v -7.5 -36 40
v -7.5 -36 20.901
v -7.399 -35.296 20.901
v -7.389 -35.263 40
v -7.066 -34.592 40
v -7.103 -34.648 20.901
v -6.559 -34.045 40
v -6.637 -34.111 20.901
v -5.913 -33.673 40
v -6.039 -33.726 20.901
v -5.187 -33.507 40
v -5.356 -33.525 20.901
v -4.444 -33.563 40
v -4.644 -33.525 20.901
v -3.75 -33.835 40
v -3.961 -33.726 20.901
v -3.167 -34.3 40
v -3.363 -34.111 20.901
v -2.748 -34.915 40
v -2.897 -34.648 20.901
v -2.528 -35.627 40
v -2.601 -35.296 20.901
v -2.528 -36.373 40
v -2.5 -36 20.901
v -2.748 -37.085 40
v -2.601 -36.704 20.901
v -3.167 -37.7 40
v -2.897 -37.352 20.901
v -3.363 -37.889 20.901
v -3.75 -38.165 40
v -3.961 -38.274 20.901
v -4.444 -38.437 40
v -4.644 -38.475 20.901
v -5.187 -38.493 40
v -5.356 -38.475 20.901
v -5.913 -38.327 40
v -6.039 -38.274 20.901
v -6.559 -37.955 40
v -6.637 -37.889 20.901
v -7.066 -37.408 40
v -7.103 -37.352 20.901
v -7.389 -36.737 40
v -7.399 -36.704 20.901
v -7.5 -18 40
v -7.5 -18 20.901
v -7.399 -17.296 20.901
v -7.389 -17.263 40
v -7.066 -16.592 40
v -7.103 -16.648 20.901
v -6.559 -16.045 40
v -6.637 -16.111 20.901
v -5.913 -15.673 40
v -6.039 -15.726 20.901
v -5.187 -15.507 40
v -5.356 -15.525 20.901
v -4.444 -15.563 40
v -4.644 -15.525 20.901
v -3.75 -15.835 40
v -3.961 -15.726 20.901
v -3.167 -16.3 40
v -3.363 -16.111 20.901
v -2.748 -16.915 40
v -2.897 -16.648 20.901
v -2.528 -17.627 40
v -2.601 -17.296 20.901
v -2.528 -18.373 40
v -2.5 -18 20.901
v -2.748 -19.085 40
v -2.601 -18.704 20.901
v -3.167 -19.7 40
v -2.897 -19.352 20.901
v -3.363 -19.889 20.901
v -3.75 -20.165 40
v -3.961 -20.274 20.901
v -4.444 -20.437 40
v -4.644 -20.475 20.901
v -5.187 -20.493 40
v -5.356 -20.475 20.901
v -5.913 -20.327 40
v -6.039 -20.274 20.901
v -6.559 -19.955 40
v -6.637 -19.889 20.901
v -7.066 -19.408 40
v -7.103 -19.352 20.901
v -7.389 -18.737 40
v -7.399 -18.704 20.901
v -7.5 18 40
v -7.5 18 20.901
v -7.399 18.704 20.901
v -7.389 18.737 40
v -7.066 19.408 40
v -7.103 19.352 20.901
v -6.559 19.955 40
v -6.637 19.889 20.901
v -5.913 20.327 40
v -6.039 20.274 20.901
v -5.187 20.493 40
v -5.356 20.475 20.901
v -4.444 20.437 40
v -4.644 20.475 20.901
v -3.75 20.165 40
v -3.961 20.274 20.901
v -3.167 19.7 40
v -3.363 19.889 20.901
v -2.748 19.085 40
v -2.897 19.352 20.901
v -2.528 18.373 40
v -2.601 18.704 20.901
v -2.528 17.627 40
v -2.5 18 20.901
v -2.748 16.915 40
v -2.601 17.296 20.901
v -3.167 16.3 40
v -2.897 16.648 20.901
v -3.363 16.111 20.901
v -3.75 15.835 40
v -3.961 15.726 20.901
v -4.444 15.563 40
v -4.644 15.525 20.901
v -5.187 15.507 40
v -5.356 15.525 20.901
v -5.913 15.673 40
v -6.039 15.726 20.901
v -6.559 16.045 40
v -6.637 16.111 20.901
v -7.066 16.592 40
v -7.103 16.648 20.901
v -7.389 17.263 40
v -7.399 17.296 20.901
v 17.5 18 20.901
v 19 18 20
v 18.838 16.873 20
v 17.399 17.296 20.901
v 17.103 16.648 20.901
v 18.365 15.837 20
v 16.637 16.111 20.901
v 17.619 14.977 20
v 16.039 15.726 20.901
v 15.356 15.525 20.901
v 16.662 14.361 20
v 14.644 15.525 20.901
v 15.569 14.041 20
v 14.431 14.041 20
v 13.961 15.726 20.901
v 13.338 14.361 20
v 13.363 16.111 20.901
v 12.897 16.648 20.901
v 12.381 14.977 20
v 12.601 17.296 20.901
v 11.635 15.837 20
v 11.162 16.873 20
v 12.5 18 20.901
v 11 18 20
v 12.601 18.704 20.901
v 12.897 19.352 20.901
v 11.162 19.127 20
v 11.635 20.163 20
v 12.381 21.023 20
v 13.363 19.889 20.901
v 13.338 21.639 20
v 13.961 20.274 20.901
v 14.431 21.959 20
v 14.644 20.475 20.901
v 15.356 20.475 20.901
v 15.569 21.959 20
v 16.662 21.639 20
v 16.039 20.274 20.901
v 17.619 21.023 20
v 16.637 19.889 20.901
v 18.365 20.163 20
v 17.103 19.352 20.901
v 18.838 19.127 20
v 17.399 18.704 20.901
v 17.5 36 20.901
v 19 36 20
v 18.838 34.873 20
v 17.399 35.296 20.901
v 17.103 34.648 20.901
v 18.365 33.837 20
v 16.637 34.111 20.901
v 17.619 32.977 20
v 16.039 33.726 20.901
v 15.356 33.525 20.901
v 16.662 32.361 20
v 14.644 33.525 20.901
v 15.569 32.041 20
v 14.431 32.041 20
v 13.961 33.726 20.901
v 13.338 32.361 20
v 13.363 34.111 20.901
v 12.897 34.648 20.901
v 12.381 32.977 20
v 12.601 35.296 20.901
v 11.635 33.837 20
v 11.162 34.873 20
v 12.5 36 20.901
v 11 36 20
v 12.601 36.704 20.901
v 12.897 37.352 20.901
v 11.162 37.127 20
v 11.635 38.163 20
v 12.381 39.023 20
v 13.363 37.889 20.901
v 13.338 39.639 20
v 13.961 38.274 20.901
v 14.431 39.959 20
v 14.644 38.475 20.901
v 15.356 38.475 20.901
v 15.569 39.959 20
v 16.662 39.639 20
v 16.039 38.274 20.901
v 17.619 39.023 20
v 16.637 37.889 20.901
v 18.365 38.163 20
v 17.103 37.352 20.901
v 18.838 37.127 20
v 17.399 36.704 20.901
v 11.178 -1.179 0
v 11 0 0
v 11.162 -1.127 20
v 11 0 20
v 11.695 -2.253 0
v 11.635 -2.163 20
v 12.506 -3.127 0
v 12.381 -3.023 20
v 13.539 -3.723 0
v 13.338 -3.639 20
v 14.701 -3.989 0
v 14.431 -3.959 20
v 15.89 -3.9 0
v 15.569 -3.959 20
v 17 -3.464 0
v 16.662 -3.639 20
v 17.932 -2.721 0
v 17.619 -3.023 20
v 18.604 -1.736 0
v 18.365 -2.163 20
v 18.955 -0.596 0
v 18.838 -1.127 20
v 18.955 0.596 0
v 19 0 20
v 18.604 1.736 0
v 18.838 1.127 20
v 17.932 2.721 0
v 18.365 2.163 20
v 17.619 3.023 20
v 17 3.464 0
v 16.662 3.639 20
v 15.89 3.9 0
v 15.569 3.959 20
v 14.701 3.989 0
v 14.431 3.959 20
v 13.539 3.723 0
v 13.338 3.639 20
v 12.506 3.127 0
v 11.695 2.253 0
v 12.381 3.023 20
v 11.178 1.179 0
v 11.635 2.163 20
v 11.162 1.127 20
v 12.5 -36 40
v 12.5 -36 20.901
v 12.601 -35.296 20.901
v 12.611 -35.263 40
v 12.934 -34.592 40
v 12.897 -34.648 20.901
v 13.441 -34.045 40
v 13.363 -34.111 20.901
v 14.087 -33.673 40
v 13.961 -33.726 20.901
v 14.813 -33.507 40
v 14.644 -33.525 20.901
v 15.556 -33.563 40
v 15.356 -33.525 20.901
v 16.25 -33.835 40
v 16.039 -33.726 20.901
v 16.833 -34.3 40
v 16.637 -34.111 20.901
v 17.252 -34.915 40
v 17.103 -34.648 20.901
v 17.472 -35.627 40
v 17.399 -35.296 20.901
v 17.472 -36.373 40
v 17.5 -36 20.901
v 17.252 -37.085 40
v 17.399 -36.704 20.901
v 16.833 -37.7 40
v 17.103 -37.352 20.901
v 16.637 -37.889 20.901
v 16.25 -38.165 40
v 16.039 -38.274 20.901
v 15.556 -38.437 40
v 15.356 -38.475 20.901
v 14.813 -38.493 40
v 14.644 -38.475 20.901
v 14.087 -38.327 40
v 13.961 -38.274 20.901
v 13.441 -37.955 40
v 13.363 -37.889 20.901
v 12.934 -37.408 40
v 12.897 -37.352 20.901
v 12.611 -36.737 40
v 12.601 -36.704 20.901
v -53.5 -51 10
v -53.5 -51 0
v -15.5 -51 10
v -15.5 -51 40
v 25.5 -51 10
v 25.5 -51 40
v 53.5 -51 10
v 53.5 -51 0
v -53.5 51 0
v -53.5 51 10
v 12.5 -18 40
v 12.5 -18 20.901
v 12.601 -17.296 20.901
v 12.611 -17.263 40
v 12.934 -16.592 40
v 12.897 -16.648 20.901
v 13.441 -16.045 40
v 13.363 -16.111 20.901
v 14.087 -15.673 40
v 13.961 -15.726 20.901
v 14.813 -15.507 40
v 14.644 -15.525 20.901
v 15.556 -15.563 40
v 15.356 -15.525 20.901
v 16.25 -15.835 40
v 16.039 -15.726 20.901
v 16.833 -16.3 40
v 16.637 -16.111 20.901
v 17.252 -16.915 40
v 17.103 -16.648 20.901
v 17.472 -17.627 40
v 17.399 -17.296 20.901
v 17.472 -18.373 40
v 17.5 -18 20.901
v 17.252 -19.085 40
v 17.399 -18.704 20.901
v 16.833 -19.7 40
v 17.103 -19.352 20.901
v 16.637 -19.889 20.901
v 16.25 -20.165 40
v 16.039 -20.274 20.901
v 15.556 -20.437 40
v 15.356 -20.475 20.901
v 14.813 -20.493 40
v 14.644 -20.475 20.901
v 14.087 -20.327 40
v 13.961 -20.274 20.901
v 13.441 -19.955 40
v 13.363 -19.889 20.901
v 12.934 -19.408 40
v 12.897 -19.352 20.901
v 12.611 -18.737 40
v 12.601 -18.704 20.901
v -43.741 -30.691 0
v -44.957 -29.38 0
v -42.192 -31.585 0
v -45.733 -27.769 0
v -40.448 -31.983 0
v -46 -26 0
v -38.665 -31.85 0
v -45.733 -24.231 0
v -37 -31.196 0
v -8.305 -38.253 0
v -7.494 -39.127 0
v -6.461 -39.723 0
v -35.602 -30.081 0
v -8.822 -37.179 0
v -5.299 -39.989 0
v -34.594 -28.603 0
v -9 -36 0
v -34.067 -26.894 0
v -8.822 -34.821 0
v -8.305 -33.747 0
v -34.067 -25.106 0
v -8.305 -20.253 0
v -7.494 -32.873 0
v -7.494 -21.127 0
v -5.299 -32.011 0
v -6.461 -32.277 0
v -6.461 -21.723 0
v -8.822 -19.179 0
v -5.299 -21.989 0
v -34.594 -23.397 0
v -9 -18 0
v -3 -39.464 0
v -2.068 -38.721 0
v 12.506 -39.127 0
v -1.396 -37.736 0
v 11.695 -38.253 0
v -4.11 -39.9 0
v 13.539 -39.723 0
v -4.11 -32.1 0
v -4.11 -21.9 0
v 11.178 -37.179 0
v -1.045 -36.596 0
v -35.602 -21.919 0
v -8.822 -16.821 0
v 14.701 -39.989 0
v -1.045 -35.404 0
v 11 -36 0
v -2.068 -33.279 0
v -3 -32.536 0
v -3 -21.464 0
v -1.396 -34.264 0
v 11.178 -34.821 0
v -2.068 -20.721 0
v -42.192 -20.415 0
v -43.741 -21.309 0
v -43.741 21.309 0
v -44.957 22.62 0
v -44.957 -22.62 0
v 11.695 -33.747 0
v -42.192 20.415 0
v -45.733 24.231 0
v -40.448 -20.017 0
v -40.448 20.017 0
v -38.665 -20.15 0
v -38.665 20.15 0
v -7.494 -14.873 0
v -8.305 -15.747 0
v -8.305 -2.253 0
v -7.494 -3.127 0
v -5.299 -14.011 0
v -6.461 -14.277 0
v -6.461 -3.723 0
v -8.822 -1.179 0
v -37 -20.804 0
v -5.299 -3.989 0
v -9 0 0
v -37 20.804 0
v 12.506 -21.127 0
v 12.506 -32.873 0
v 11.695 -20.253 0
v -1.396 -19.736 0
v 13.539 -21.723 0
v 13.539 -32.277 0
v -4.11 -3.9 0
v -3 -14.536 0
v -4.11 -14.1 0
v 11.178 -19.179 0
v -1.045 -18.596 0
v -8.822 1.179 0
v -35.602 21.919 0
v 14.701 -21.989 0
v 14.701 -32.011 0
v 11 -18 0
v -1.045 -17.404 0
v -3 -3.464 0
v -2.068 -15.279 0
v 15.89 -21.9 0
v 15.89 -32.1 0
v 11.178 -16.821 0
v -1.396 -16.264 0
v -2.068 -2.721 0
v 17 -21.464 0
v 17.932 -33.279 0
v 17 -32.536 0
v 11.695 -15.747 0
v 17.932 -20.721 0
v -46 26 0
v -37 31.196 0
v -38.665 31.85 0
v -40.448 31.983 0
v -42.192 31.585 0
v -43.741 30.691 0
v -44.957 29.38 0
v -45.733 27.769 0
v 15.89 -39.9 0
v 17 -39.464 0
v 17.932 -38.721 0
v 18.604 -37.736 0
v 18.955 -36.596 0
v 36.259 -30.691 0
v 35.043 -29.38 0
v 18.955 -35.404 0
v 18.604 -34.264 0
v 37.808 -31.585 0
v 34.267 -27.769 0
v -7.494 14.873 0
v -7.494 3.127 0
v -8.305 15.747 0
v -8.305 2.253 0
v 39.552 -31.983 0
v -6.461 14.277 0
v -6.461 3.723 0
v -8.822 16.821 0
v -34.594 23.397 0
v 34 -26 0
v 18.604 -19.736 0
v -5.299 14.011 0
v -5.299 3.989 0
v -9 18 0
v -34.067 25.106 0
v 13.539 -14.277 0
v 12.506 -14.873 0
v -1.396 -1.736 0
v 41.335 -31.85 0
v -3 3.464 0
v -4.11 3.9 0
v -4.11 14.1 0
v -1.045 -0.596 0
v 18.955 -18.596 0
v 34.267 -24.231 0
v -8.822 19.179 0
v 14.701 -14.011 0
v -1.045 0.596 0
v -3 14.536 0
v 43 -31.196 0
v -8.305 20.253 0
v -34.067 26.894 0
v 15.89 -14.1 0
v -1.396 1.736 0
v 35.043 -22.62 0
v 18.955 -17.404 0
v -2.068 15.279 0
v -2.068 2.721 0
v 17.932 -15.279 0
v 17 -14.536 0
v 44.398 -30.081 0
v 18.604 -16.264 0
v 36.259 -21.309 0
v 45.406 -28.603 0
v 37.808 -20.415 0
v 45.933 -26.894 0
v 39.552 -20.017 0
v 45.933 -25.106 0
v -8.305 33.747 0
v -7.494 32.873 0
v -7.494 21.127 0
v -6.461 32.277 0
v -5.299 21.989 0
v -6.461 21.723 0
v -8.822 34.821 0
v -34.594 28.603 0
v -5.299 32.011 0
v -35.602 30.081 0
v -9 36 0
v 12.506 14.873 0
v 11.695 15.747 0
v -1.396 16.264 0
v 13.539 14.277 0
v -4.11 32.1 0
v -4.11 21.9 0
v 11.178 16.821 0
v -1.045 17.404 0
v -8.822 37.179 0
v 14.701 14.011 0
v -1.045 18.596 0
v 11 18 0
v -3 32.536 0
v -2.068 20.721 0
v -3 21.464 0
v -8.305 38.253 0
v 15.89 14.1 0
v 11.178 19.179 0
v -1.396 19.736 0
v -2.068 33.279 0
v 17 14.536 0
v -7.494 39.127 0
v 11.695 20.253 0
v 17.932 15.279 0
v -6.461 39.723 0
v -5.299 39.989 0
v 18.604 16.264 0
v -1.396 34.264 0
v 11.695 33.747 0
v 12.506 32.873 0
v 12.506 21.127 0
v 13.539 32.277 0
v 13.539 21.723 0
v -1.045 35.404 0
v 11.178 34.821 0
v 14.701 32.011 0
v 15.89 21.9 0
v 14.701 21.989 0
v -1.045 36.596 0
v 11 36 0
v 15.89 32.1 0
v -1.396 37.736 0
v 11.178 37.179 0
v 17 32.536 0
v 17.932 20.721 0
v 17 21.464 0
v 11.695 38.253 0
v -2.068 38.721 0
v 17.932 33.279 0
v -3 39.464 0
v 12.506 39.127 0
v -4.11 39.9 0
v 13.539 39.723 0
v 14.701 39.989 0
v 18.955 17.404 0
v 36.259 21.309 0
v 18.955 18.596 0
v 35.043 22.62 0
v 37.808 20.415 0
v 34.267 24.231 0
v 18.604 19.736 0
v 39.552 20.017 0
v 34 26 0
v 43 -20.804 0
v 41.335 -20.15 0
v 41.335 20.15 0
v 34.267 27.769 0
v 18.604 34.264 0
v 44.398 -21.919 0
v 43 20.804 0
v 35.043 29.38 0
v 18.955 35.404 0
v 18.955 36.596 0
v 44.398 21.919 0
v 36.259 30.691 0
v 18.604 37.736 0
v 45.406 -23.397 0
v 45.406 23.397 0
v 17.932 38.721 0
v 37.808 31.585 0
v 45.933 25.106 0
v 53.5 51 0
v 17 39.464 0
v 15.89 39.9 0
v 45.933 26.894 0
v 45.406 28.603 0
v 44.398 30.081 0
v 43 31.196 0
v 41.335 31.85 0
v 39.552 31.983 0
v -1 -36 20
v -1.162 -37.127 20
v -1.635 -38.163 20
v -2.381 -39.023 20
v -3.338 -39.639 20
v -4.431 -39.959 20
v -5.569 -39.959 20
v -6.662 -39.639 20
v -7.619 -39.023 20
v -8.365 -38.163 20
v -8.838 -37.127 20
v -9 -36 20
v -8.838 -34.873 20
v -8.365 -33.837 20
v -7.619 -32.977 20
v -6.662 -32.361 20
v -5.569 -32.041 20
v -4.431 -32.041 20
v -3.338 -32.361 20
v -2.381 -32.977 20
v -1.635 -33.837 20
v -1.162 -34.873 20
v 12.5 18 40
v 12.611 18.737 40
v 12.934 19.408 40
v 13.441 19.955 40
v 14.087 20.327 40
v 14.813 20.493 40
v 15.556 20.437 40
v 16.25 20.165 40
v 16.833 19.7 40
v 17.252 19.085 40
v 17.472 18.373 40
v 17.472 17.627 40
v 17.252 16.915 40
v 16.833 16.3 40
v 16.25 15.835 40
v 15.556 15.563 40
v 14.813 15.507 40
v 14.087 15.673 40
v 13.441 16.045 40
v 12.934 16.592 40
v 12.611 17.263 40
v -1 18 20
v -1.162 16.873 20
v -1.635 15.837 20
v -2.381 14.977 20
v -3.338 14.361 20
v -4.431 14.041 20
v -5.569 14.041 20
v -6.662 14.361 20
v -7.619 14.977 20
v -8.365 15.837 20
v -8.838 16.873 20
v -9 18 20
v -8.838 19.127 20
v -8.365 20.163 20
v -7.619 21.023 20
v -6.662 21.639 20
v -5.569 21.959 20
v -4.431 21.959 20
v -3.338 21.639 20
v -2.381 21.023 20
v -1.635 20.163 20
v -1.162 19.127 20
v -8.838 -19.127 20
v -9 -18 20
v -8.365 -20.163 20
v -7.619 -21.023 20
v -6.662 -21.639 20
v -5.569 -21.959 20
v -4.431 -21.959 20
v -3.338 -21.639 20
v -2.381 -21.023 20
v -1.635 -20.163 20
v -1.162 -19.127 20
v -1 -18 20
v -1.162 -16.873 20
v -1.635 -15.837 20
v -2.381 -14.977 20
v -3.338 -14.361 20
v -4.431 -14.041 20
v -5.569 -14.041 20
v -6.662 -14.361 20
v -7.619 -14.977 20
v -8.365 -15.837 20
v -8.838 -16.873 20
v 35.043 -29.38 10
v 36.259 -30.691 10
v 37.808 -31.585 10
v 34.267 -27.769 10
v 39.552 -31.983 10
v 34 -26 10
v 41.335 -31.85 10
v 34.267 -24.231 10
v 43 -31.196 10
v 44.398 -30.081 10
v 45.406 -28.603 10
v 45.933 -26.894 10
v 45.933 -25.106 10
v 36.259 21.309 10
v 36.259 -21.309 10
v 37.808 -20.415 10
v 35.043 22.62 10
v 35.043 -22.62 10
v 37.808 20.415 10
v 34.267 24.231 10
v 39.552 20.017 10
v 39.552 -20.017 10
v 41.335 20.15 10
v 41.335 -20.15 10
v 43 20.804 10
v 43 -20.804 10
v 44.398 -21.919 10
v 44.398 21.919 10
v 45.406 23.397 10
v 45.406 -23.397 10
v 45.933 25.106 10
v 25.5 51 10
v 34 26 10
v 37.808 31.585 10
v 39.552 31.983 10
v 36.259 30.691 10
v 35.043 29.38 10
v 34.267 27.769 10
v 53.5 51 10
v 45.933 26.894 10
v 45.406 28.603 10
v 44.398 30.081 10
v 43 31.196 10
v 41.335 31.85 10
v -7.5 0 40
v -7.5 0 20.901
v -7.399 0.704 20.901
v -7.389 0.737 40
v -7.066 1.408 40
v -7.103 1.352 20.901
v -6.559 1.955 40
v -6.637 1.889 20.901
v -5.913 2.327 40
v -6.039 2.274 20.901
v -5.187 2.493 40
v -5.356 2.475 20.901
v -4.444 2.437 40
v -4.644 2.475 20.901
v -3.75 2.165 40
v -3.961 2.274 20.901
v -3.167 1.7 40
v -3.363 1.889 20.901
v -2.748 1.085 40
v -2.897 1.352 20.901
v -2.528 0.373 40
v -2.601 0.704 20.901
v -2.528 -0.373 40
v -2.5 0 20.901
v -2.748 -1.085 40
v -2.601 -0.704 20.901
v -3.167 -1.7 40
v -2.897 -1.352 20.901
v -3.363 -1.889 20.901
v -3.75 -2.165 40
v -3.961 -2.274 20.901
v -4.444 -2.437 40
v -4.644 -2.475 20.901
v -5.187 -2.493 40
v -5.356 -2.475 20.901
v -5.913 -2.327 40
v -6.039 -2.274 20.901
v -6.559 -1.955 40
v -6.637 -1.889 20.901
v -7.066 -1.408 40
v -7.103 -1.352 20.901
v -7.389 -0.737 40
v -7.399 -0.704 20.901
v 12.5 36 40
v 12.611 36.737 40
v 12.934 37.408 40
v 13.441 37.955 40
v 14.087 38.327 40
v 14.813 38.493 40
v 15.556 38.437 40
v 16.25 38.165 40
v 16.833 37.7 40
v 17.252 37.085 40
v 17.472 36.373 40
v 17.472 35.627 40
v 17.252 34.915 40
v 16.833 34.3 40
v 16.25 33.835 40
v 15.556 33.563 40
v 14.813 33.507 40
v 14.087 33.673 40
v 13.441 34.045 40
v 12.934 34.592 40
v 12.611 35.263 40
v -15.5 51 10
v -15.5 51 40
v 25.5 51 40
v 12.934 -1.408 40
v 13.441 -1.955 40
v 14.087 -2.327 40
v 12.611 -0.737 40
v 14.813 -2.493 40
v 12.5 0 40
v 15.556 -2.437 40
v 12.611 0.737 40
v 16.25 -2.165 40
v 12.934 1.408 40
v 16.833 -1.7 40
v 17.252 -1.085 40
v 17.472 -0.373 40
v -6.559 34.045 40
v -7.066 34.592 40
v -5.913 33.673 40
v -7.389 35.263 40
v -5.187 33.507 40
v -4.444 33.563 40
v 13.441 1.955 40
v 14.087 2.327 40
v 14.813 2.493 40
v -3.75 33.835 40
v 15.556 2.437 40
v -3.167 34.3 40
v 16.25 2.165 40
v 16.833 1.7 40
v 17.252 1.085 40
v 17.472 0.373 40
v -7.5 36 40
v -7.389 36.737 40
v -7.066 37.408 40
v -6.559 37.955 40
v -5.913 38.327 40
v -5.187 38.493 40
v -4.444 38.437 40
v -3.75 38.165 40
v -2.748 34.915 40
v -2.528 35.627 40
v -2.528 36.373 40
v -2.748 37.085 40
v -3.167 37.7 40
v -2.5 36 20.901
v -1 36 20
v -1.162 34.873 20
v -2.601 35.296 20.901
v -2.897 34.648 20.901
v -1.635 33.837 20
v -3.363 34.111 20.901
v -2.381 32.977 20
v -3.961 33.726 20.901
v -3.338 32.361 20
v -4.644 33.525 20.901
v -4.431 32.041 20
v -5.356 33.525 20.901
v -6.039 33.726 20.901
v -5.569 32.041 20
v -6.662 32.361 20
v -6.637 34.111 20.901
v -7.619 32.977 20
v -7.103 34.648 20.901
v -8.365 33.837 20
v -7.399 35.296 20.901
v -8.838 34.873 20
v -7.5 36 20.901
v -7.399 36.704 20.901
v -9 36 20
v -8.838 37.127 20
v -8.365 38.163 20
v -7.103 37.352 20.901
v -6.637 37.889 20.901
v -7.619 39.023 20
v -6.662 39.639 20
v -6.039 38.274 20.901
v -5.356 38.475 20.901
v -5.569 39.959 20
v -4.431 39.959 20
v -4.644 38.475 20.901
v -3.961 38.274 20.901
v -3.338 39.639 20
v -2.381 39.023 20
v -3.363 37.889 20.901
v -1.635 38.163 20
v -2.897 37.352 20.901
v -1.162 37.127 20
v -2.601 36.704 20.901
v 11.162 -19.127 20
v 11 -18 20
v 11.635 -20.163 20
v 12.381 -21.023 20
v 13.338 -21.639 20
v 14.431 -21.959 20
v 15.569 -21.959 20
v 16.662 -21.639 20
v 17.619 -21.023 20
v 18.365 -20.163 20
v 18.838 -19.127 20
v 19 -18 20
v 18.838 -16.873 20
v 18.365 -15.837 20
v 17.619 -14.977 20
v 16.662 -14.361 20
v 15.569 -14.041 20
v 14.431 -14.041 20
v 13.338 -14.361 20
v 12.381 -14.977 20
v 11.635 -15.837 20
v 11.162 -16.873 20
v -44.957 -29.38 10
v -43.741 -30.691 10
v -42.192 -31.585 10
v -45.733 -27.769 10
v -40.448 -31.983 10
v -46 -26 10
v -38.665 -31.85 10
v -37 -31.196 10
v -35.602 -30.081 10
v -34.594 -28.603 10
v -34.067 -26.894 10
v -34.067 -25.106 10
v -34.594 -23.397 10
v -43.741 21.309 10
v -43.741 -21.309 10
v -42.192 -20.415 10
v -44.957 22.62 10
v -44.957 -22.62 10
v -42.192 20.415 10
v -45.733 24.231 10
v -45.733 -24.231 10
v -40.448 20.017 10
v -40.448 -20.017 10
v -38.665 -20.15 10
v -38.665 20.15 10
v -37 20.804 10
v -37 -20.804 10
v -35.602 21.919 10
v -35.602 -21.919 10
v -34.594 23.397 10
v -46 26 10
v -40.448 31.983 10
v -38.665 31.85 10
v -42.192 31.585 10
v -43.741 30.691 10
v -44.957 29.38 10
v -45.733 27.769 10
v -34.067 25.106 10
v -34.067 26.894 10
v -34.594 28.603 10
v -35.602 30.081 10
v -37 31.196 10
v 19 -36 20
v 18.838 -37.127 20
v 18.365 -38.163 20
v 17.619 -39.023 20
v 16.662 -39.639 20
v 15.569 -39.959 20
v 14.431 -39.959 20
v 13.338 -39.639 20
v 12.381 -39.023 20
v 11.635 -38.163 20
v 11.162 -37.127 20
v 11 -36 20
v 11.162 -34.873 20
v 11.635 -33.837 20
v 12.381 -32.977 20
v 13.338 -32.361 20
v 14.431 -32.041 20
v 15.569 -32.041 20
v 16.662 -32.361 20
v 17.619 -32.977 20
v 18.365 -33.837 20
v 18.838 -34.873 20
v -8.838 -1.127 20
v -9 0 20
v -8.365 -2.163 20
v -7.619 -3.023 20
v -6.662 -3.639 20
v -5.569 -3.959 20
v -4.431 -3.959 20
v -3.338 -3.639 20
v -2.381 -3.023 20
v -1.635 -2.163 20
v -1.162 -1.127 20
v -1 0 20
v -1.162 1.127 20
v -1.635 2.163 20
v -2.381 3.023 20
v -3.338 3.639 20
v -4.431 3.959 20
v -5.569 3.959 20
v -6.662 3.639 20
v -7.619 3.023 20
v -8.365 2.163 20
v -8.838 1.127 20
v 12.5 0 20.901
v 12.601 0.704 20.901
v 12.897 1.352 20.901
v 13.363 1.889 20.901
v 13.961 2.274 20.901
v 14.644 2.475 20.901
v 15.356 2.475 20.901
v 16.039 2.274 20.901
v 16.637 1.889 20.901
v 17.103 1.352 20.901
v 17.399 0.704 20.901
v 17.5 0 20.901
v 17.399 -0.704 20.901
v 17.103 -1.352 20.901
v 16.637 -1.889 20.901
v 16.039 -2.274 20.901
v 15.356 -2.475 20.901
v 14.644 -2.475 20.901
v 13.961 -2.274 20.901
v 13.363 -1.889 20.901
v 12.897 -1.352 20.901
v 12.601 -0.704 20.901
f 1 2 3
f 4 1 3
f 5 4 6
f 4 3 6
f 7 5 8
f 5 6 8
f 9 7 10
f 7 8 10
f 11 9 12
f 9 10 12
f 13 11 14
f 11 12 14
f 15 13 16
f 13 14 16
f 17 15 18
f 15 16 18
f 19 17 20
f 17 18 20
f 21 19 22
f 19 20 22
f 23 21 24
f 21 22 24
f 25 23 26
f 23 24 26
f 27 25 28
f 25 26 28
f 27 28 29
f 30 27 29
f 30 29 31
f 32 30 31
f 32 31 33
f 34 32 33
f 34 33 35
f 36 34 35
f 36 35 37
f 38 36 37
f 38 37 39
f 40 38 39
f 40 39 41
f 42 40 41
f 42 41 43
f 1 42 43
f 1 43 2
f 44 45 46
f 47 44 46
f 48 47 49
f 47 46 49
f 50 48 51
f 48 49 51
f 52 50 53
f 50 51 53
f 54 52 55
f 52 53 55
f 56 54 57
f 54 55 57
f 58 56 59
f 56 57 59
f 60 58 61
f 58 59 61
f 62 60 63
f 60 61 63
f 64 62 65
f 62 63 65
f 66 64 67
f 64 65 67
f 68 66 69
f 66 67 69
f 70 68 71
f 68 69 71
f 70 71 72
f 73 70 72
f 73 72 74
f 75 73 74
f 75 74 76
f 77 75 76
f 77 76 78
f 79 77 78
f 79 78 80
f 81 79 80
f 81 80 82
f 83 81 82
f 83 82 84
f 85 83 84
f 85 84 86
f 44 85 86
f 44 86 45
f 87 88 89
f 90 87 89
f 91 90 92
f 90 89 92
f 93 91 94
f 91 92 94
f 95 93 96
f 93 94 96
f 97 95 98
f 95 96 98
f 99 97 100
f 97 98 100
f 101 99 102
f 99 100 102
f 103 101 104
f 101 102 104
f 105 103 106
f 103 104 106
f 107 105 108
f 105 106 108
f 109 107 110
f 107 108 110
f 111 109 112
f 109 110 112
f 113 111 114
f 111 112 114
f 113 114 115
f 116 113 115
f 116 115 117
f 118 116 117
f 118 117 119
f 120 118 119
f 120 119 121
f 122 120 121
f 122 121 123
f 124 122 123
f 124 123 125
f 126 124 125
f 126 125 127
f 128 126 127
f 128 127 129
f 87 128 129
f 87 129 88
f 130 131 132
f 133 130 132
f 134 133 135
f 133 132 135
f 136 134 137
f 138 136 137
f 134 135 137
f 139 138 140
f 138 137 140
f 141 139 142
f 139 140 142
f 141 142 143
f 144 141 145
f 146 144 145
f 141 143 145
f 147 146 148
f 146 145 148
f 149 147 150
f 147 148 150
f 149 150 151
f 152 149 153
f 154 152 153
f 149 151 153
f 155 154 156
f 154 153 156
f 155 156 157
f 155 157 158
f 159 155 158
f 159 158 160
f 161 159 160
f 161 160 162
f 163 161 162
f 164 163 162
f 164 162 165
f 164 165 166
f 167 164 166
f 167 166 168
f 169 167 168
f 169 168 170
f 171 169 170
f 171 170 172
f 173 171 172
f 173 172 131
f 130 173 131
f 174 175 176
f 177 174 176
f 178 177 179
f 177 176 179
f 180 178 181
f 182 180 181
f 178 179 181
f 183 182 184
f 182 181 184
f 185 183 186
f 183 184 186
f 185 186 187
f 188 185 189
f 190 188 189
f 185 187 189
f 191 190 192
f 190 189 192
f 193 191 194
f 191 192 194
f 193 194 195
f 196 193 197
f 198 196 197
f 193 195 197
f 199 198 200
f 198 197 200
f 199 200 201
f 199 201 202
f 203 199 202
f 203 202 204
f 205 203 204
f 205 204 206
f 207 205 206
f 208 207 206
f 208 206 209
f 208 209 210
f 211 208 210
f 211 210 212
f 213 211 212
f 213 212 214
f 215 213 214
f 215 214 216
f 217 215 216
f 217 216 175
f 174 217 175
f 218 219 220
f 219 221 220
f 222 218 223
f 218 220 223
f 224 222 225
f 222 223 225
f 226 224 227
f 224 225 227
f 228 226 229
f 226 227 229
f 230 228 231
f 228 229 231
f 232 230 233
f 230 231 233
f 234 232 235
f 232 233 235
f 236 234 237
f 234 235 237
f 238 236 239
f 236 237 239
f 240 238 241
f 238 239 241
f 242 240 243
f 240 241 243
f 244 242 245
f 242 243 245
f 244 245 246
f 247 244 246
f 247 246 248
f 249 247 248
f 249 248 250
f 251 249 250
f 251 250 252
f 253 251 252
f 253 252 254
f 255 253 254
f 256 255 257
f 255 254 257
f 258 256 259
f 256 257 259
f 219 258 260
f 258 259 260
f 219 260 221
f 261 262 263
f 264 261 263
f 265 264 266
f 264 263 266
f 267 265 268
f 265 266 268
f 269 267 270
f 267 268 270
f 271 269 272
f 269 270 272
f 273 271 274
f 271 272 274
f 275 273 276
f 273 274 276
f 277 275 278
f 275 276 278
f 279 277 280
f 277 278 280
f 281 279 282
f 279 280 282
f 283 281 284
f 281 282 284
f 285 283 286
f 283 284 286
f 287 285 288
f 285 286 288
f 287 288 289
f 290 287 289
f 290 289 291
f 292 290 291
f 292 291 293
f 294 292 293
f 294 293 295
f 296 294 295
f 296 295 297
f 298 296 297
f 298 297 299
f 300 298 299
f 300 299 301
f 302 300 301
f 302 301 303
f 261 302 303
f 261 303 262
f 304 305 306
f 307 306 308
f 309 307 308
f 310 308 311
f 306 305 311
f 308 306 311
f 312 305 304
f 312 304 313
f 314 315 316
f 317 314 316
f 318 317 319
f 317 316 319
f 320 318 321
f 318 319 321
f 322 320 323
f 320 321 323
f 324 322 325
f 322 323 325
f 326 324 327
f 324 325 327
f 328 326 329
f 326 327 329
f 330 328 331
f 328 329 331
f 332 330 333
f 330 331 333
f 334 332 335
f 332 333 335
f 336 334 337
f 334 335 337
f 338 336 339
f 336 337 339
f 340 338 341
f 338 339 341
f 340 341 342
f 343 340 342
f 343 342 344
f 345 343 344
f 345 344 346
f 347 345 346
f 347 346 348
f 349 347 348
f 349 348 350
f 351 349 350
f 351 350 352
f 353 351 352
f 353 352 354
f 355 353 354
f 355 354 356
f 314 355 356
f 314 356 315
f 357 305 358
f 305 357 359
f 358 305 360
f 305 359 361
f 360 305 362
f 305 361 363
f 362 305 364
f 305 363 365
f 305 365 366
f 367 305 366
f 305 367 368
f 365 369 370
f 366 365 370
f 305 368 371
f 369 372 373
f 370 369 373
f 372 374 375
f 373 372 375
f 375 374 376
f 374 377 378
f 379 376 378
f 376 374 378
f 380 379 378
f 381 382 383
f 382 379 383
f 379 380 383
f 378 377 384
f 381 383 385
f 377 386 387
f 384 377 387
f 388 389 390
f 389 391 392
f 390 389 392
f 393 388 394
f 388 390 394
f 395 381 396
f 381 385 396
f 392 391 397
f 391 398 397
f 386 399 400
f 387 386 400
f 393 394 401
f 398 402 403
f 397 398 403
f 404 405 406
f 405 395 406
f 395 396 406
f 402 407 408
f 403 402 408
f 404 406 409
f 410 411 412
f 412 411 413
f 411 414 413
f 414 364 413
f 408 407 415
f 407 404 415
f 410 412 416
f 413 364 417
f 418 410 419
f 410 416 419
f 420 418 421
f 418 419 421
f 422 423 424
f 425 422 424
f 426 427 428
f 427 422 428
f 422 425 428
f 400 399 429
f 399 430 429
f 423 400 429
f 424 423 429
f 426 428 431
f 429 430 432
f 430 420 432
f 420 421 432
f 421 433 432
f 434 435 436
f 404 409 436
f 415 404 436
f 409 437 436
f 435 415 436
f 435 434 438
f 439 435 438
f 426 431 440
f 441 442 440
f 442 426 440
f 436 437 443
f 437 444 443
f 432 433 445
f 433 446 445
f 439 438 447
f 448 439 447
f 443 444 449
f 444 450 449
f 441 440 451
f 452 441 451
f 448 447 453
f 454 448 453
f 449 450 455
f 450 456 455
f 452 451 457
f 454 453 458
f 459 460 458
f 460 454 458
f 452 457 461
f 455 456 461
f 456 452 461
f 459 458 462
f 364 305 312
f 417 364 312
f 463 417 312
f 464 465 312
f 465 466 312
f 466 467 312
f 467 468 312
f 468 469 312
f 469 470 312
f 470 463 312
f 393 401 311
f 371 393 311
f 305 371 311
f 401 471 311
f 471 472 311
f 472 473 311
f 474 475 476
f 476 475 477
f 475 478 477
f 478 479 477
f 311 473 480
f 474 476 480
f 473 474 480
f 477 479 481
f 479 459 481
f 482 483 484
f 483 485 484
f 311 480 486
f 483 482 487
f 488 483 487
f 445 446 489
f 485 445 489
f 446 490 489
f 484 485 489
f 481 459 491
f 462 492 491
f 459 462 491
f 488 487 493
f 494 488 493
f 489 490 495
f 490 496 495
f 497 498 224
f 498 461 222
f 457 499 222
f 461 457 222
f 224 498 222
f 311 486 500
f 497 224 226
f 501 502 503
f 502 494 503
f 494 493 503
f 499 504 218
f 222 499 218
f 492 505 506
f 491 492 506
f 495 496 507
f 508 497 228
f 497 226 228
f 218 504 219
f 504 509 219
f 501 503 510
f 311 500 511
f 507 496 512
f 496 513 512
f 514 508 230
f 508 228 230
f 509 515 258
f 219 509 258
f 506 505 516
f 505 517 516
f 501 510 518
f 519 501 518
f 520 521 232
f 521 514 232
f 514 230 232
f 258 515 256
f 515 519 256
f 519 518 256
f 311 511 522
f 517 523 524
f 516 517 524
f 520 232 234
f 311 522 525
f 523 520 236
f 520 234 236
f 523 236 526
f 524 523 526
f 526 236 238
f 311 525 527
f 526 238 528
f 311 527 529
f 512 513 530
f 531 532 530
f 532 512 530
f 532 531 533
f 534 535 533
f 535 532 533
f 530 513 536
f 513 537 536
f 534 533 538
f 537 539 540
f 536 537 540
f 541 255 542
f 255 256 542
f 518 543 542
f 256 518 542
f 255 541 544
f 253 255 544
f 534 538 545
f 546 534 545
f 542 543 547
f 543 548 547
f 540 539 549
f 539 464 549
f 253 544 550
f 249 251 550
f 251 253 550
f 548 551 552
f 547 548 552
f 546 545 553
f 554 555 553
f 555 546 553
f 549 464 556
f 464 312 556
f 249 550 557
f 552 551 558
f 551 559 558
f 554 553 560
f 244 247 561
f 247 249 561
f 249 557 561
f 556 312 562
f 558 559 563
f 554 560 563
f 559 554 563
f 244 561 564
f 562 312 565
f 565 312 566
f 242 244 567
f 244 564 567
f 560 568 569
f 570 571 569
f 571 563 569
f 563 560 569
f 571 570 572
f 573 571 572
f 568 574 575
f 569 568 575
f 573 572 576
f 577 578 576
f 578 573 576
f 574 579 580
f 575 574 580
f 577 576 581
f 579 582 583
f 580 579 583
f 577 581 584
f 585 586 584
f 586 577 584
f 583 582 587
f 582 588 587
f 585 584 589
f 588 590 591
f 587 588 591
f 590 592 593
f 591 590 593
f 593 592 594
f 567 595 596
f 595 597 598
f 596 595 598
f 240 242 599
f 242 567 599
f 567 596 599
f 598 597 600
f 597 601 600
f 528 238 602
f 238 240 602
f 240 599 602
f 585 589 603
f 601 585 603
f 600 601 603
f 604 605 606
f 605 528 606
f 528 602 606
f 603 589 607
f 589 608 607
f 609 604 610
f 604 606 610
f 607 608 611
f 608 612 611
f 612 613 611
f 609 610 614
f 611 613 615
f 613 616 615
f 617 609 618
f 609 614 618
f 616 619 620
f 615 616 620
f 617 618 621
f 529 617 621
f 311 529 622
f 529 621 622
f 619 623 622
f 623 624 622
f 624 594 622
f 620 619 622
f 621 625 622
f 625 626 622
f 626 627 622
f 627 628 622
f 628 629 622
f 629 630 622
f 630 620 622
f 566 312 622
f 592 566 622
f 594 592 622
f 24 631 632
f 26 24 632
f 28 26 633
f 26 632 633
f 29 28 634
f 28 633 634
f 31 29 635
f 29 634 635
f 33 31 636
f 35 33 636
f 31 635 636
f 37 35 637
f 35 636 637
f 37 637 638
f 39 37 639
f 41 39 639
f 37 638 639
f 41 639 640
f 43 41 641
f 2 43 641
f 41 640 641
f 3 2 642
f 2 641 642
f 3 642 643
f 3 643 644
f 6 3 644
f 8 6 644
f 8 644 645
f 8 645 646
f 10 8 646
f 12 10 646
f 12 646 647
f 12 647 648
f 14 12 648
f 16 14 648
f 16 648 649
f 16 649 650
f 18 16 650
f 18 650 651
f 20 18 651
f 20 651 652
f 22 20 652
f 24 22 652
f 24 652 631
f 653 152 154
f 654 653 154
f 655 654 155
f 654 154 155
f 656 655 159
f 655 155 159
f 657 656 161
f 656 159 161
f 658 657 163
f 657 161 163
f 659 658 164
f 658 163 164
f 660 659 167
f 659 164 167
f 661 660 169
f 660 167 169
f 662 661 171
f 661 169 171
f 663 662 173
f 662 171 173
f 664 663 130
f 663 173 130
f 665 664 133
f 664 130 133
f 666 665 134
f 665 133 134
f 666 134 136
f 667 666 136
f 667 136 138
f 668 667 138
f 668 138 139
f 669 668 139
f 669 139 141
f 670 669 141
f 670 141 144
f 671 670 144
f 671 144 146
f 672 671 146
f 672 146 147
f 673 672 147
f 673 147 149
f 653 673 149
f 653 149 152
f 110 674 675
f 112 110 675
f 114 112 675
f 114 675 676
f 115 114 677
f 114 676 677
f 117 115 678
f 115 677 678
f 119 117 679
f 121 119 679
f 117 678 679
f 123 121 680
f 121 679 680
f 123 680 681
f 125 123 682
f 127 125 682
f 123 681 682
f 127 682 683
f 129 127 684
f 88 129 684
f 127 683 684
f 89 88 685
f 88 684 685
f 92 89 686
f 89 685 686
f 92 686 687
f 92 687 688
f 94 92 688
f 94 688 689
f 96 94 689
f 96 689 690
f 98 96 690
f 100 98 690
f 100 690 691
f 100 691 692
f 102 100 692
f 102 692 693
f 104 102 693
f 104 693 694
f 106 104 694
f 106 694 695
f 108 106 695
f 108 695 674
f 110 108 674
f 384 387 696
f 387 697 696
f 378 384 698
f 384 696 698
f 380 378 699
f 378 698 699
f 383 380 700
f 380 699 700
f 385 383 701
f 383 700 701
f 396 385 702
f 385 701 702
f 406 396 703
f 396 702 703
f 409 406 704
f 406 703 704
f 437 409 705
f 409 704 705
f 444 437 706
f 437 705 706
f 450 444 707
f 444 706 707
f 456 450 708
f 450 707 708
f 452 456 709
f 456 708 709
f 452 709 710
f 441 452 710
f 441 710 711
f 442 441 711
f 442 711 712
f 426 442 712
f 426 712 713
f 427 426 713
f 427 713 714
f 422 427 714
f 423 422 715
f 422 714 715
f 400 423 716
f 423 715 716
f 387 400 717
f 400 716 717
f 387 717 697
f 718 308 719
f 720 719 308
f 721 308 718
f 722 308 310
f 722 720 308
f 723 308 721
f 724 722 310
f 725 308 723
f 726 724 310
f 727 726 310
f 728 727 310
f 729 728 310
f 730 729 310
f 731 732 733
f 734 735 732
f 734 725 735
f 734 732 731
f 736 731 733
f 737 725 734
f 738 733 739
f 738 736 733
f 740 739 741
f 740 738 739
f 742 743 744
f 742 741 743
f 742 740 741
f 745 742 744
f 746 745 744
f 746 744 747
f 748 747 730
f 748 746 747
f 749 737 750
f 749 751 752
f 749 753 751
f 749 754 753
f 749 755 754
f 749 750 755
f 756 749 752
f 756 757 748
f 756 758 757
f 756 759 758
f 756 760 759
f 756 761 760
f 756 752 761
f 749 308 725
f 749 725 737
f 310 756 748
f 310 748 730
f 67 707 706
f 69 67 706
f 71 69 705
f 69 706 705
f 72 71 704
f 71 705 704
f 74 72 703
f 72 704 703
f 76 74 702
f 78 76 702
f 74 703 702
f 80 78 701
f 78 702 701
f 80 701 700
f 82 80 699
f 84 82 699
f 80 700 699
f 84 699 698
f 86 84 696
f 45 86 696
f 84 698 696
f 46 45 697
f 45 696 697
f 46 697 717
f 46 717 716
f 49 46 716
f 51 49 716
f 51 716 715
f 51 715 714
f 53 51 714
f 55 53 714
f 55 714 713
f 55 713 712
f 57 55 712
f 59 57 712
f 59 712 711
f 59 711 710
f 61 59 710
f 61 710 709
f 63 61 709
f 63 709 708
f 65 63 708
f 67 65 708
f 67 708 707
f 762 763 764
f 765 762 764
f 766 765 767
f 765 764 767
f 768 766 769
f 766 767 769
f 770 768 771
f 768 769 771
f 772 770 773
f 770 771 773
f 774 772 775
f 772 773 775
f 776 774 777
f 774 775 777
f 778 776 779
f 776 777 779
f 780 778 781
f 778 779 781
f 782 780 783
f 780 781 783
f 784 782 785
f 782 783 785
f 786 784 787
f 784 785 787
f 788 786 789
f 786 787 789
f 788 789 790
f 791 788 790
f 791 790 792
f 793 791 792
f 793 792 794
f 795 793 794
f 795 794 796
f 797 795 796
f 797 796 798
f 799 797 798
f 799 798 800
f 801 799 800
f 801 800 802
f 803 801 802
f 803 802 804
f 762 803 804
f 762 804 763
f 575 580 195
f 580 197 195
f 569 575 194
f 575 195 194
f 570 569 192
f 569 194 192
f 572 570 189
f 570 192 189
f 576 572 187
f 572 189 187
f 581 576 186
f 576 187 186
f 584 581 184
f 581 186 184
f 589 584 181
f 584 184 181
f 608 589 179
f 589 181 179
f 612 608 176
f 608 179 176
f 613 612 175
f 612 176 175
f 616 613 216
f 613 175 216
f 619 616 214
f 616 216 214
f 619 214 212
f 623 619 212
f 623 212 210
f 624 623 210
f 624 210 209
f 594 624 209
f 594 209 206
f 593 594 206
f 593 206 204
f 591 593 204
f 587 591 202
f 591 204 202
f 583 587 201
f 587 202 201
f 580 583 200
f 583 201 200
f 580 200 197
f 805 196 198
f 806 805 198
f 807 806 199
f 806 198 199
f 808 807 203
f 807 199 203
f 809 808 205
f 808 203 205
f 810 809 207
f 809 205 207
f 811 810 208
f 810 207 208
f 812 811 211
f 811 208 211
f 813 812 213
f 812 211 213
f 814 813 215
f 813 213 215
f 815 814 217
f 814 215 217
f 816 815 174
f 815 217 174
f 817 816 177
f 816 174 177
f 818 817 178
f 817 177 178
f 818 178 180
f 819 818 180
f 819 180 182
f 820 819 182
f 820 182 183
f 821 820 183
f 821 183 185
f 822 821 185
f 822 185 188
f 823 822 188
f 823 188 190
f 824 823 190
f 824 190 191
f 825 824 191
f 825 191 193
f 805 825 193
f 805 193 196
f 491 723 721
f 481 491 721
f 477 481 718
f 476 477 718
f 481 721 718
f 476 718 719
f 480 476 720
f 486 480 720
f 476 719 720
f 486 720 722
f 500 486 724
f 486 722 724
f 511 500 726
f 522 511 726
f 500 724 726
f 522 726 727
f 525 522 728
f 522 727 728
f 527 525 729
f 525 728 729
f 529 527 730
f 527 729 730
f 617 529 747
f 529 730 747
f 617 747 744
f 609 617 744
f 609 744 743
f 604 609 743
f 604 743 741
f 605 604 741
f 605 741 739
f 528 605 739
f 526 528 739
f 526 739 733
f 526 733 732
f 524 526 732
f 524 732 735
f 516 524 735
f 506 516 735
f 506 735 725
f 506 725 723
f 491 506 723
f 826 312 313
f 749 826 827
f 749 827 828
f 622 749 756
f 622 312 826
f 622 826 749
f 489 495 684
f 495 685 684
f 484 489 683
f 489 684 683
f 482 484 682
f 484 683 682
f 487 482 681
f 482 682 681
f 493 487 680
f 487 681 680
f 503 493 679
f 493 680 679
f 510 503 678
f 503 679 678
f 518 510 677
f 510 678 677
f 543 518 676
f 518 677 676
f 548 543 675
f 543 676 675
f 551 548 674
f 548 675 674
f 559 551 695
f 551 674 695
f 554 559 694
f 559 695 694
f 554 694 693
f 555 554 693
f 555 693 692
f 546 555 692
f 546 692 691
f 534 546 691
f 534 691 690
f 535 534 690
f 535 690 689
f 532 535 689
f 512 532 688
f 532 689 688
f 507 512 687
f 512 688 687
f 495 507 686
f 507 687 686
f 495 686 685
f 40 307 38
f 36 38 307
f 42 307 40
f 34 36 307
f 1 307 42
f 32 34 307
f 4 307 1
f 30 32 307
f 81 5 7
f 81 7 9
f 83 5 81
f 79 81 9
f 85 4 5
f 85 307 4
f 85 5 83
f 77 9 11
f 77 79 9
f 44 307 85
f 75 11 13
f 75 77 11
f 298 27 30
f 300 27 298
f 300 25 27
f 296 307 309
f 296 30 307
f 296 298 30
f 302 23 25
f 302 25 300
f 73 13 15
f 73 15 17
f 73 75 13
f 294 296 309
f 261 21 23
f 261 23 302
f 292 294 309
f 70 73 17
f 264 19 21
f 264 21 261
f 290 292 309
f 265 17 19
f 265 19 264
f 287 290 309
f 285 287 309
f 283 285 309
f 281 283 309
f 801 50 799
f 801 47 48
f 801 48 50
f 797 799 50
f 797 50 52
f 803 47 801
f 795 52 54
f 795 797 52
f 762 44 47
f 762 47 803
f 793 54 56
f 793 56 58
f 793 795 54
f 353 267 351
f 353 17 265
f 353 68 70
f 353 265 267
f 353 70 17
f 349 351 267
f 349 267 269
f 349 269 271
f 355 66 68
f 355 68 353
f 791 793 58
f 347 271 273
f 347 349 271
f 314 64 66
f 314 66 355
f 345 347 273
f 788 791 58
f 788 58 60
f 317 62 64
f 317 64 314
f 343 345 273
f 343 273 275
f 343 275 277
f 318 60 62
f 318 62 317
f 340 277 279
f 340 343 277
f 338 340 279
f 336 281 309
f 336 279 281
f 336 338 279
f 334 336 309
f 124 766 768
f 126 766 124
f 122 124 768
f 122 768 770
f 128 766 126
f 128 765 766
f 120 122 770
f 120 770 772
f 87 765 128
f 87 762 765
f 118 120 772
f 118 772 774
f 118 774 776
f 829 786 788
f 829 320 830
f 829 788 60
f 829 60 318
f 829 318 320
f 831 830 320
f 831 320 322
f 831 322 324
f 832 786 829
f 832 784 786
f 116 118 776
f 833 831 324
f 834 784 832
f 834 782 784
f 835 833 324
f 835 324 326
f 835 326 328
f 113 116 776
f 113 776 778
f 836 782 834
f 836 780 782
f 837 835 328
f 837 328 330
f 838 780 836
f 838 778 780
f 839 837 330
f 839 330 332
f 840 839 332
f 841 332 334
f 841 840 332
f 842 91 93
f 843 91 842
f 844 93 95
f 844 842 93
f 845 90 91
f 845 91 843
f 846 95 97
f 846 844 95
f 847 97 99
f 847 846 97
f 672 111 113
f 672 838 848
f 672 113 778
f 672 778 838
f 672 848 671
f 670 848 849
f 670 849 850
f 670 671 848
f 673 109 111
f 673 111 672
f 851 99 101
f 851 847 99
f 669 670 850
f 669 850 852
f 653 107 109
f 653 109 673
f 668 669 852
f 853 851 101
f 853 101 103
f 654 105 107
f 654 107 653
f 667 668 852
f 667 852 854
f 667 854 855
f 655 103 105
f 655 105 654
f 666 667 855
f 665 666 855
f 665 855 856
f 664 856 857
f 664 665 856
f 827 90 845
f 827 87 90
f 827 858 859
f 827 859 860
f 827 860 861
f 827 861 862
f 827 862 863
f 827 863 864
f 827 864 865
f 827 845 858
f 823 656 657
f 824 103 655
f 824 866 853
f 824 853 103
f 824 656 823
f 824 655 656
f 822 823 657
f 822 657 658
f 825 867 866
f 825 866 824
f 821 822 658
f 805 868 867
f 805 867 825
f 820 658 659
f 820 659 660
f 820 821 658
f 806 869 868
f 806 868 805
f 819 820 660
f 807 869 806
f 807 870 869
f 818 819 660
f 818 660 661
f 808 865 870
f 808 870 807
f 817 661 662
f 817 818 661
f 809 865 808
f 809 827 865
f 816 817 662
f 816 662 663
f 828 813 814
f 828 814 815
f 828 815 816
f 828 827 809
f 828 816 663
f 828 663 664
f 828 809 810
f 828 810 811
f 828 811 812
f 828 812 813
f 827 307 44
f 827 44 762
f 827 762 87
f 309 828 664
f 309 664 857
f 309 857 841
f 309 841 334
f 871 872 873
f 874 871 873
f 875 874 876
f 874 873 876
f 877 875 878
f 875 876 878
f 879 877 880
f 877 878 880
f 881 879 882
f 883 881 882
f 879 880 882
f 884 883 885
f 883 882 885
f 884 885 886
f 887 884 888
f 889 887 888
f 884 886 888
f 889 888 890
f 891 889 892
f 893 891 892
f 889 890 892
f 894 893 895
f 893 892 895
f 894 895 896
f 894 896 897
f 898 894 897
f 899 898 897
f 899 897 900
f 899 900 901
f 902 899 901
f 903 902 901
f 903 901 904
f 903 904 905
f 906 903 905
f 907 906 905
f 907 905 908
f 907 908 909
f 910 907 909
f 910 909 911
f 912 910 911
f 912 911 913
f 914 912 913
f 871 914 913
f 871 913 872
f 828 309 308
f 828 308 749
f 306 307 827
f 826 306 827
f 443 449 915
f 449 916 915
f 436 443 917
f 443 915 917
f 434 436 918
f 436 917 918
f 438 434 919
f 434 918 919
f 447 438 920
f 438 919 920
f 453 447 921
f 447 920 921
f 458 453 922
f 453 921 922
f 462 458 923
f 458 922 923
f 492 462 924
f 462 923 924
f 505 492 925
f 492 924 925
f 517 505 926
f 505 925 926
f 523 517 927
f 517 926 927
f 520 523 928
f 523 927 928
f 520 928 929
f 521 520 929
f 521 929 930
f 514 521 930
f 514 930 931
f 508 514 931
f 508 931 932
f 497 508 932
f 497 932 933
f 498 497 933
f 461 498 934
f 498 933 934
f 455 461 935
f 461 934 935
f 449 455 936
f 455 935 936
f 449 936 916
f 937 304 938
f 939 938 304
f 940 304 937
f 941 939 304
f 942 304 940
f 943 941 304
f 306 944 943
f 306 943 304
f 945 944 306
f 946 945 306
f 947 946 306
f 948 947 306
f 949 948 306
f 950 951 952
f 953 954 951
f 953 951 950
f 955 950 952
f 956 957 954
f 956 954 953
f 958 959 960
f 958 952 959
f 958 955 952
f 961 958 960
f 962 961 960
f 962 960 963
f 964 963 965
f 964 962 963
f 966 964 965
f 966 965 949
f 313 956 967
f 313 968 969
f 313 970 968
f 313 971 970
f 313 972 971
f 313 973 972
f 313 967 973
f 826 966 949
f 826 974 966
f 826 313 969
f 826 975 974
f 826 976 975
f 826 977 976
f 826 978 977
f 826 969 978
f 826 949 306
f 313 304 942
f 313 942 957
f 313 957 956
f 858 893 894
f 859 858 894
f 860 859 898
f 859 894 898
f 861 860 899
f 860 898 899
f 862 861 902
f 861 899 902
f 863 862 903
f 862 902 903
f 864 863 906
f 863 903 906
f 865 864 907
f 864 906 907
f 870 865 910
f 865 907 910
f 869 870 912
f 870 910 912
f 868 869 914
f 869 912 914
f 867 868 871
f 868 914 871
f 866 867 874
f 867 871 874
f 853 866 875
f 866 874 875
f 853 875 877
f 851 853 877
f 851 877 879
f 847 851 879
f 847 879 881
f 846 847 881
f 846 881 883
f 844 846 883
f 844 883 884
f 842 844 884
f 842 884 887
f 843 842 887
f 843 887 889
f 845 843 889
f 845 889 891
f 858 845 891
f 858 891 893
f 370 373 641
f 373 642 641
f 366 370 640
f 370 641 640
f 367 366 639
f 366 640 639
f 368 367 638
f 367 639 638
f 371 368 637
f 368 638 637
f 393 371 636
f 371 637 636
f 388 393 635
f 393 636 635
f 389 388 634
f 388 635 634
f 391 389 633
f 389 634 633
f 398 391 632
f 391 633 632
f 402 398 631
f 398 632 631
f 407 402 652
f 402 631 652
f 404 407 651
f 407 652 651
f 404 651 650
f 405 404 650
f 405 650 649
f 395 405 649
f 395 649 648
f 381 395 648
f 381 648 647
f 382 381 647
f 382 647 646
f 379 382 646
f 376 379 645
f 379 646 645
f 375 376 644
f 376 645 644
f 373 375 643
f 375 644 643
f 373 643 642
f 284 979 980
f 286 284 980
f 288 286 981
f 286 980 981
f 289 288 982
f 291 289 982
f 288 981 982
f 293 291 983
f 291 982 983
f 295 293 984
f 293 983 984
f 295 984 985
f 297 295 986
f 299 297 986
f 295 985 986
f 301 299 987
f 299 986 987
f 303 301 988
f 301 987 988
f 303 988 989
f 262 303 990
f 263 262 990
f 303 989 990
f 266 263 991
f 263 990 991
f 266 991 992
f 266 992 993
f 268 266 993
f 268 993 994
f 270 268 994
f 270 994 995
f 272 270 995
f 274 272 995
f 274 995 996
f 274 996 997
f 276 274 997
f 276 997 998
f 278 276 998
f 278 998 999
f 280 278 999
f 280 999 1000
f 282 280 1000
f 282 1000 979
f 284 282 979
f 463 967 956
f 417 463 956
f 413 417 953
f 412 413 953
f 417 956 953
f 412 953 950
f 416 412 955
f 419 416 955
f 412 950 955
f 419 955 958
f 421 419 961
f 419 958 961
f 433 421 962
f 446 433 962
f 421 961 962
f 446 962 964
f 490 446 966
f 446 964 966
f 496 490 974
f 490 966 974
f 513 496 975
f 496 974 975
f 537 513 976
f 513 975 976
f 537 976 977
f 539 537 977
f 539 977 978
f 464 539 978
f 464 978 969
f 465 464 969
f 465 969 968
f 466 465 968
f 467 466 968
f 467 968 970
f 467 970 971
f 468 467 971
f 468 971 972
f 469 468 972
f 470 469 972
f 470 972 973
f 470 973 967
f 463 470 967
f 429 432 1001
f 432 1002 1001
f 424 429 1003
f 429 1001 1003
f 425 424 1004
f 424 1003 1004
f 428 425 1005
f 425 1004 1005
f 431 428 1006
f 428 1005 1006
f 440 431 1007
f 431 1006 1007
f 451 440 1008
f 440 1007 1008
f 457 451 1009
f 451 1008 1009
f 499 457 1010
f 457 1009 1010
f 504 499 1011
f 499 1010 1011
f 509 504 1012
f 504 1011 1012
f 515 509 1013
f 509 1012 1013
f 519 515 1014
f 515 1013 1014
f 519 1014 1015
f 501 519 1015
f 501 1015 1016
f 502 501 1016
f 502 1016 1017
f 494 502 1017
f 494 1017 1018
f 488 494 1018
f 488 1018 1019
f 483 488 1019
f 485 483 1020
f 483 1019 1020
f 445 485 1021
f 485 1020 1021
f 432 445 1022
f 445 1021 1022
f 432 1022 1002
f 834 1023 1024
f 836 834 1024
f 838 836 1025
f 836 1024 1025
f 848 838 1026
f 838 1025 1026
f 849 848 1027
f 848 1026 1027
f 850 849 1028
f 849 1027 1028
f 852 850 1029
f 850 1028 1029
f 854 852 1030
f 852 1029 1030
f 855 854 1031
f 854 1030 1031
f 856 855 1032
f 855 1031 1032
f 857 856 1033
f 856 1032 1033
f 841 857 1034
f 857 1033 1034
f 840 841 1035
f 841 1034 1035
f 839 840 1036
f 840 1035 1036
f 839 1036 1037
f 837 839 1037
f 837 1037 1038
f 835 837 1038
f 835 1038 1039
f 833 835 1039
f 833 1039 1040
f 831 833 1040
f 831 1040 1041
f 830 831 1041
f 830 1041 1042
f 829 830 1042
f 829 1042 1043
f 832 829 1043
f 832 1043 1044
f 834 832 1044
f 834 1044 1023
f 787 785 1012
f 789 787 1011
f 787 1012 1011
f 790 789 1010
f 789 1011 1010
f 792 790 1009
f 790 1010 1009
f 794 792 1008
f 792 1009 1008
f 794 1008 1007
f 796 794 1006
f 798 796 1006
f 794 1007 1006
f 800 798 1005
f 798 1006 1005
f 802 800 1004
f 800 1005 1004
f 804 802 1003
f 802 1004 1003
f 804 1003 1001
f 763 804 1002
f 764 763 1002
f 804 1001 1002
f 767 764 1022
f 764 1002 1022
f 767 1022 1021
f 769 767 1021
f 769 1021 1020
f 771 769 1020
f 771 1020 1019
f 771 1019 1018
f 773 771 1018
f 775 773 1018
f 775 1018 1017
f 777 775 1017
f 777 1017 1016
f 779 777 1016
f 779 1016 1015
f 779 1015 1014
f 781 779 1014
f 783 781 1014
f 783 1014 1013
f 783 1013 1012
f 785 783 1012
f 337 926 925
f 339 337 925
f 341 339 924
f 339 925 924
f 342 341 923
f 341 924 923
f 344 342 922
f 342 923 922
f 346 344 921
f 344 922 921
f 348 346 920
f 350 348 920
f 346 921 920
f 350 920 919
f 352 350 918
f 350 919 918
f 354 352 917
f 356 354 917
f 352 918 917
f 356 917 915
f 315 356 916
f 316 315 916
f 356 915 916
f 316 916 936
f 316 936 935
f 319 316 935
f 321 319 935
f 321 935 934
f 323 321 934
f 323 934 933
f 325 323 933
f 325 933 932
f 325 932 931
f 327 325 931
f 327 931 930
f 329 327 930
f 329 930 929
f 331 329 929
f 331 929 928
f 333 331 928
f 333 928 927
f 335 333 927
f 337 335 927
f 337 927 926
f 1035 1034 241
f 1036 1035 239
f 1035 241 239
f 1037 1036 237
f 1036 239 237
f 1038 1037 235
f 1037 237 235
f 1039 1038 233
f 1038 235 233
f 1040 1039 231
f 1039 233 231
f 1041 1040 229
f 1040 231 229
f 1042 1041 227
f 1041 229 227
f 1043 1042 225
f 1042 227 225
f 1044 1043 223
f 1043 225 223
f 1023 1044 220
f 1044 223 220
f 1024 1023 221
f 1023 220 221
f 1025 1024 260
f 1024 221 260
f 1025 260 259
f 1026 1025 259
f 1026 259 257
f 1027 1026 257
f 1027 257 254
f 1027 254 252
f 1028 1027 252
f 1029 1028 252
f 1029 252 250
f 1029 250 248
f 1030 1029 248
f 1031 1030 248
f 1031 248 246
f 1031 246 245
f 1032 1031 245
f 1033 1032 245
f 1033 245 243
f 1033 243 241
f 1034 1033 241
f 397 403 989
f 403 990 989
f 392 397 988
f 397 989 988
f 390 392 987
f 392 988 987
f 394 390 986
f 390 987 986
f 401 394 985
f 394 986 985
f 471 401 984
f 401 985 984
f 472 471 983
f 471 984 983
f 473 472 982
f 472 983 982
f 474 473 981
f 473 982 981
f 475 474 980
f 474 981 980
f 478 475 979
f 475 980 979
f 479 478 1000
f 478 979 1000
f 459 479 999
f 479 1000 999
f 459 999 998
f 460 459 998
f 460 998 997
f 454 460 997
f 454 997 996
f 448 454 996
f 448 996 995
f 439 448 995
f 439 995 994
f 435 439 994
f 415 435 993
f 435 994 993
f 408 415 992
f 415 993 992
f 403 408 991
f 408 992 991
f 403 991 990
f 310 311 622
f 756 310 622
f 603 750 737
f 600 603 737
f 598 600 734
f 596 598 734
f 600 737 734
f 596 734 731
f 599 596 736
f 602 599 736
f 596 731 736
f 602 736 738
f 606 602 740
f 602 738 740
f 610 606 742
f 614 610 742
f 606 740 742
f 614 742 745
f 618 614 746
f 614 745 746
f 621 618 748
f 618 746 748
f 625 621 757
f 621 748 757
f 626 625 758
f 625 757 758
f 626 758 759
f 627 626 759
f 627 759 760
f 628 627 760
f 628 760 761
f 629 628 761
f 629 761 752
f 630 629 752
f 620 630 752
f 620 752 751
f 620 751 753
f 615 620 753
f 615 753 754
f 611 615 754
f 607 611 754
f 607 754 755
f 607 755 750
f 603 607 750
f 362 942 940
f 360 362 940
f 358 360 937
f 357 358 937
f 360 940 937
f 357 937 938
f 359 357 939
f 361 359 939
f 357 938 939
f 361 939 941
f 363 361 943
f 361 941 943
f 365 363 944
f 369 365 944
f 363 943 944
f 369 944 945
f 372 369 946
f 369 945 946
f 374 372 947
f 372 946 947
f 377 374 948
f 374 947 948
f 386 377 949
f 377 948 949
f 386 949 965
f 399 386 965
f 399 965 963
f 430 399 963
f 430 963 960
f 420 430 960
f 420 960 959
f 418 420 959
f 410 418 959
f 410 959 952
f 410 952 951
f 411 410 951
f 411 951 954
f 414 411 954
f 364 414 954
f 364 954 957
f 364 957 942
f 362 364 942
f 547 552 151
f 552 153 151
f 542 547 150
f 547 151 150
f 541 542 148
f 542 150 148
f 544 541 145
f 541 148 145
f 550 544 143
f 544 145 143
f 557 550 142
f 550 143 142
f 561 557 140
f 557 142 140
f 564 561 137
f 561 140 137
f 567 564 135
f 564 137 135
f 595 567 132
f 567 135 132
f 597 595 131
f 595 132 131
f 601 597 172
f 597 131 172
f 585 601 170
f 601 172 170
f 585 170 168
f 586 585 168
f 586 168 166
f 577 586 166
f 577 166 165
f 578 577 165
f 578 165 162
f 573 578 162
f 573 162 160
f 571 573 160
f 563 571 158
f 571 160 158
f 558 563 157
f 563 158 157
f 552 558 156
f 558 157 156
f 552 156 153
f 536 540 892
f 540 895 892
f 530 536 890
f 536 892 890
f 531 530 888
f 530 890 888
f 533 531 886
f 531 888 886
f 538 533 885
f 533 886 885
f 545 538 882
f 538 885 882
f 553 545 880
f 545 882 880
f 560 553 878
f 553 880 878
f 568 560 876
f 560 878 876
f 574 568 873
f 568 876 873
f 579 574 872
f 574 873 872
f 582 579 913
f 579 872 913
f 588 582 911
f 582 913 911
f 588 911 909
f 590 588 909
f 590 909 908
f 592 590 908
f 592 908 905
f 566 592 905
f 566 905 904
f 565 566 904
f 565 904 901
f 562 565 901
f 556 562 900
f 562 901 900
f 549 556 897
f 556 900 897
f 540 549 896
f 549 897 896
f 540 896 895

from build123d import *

# Parameters (mm, degrees)
F0_W     = 107
F0_H     = 102
F1_DEPTH = 40
F2_W     = 38
F2_H     = 102
F2_W_2   = 28
F3_DEPTH = 30
F5_D     = 8
F5_DEPTH = 20
F5_TIP   = 2.4034424761
F7_D     = 5
F9_D     = 12


with BuildPart() as f1:
    # F0 (on Top) → F1 (new body)
    with BuildSketch(Plane.XY):
        Rectangle(F0_W, F0_H)
    extrude(amount=F1_DEPTH)

    # F2 (on face) → F3 (cut)
    with BuildSketch(Plane.XY.offset(40)):
        with Locations((-34.5, 0)):
            Rectangle(F2_W, F2_H)
        with Locations((39.5, 0)):
            Rectangle(F2_W_2, F2_H)
    extrude(amount=-F3_DEPTH, mode=Mode.SUBTRACT)

    # F5
    with Locations(Plane(origin=(0, 0, 0), x_dir=(1, 0, 0), z_dir=(0, 0, -1))):
        with Locations((-5, -18), (-5, -36), (15, -36), (15, -18), (-5, 0), (15, 0), (15, 18), (-5, 18), (-5, 36), (15, 36)):
            Hole(F5_D / 2, depth=F5_DEPTH)
            with Locations((0, 0, -(F5_DEPTH + F5_TIP / 2))):  # 118° drill point
                Cone(0, F5_D / 2, F5_TIP, mode=Mode.SUBTRACT)

    # F7 (through all)
    with Locations(Plane.XY.offset(40)):
        with Locations((-5, -36), (15, -36), (-5, -18), (15, -18), (-5, 0), (15, 0), (-5, 18), (15, 18), (-5, 36), (15, 36)):
            Hole(F7_D / 2)

    # F9 (through all)
    with Locations(Plane(origin=(0, 0, 0), x_dir=(1, 0, 0), z_dir=(0, 0, -1))):
        with Locations((-40, 26), (-40, -26), (40, -26), (40, 26)):
            Hole(F9_D / 2)


solid = f1.part
